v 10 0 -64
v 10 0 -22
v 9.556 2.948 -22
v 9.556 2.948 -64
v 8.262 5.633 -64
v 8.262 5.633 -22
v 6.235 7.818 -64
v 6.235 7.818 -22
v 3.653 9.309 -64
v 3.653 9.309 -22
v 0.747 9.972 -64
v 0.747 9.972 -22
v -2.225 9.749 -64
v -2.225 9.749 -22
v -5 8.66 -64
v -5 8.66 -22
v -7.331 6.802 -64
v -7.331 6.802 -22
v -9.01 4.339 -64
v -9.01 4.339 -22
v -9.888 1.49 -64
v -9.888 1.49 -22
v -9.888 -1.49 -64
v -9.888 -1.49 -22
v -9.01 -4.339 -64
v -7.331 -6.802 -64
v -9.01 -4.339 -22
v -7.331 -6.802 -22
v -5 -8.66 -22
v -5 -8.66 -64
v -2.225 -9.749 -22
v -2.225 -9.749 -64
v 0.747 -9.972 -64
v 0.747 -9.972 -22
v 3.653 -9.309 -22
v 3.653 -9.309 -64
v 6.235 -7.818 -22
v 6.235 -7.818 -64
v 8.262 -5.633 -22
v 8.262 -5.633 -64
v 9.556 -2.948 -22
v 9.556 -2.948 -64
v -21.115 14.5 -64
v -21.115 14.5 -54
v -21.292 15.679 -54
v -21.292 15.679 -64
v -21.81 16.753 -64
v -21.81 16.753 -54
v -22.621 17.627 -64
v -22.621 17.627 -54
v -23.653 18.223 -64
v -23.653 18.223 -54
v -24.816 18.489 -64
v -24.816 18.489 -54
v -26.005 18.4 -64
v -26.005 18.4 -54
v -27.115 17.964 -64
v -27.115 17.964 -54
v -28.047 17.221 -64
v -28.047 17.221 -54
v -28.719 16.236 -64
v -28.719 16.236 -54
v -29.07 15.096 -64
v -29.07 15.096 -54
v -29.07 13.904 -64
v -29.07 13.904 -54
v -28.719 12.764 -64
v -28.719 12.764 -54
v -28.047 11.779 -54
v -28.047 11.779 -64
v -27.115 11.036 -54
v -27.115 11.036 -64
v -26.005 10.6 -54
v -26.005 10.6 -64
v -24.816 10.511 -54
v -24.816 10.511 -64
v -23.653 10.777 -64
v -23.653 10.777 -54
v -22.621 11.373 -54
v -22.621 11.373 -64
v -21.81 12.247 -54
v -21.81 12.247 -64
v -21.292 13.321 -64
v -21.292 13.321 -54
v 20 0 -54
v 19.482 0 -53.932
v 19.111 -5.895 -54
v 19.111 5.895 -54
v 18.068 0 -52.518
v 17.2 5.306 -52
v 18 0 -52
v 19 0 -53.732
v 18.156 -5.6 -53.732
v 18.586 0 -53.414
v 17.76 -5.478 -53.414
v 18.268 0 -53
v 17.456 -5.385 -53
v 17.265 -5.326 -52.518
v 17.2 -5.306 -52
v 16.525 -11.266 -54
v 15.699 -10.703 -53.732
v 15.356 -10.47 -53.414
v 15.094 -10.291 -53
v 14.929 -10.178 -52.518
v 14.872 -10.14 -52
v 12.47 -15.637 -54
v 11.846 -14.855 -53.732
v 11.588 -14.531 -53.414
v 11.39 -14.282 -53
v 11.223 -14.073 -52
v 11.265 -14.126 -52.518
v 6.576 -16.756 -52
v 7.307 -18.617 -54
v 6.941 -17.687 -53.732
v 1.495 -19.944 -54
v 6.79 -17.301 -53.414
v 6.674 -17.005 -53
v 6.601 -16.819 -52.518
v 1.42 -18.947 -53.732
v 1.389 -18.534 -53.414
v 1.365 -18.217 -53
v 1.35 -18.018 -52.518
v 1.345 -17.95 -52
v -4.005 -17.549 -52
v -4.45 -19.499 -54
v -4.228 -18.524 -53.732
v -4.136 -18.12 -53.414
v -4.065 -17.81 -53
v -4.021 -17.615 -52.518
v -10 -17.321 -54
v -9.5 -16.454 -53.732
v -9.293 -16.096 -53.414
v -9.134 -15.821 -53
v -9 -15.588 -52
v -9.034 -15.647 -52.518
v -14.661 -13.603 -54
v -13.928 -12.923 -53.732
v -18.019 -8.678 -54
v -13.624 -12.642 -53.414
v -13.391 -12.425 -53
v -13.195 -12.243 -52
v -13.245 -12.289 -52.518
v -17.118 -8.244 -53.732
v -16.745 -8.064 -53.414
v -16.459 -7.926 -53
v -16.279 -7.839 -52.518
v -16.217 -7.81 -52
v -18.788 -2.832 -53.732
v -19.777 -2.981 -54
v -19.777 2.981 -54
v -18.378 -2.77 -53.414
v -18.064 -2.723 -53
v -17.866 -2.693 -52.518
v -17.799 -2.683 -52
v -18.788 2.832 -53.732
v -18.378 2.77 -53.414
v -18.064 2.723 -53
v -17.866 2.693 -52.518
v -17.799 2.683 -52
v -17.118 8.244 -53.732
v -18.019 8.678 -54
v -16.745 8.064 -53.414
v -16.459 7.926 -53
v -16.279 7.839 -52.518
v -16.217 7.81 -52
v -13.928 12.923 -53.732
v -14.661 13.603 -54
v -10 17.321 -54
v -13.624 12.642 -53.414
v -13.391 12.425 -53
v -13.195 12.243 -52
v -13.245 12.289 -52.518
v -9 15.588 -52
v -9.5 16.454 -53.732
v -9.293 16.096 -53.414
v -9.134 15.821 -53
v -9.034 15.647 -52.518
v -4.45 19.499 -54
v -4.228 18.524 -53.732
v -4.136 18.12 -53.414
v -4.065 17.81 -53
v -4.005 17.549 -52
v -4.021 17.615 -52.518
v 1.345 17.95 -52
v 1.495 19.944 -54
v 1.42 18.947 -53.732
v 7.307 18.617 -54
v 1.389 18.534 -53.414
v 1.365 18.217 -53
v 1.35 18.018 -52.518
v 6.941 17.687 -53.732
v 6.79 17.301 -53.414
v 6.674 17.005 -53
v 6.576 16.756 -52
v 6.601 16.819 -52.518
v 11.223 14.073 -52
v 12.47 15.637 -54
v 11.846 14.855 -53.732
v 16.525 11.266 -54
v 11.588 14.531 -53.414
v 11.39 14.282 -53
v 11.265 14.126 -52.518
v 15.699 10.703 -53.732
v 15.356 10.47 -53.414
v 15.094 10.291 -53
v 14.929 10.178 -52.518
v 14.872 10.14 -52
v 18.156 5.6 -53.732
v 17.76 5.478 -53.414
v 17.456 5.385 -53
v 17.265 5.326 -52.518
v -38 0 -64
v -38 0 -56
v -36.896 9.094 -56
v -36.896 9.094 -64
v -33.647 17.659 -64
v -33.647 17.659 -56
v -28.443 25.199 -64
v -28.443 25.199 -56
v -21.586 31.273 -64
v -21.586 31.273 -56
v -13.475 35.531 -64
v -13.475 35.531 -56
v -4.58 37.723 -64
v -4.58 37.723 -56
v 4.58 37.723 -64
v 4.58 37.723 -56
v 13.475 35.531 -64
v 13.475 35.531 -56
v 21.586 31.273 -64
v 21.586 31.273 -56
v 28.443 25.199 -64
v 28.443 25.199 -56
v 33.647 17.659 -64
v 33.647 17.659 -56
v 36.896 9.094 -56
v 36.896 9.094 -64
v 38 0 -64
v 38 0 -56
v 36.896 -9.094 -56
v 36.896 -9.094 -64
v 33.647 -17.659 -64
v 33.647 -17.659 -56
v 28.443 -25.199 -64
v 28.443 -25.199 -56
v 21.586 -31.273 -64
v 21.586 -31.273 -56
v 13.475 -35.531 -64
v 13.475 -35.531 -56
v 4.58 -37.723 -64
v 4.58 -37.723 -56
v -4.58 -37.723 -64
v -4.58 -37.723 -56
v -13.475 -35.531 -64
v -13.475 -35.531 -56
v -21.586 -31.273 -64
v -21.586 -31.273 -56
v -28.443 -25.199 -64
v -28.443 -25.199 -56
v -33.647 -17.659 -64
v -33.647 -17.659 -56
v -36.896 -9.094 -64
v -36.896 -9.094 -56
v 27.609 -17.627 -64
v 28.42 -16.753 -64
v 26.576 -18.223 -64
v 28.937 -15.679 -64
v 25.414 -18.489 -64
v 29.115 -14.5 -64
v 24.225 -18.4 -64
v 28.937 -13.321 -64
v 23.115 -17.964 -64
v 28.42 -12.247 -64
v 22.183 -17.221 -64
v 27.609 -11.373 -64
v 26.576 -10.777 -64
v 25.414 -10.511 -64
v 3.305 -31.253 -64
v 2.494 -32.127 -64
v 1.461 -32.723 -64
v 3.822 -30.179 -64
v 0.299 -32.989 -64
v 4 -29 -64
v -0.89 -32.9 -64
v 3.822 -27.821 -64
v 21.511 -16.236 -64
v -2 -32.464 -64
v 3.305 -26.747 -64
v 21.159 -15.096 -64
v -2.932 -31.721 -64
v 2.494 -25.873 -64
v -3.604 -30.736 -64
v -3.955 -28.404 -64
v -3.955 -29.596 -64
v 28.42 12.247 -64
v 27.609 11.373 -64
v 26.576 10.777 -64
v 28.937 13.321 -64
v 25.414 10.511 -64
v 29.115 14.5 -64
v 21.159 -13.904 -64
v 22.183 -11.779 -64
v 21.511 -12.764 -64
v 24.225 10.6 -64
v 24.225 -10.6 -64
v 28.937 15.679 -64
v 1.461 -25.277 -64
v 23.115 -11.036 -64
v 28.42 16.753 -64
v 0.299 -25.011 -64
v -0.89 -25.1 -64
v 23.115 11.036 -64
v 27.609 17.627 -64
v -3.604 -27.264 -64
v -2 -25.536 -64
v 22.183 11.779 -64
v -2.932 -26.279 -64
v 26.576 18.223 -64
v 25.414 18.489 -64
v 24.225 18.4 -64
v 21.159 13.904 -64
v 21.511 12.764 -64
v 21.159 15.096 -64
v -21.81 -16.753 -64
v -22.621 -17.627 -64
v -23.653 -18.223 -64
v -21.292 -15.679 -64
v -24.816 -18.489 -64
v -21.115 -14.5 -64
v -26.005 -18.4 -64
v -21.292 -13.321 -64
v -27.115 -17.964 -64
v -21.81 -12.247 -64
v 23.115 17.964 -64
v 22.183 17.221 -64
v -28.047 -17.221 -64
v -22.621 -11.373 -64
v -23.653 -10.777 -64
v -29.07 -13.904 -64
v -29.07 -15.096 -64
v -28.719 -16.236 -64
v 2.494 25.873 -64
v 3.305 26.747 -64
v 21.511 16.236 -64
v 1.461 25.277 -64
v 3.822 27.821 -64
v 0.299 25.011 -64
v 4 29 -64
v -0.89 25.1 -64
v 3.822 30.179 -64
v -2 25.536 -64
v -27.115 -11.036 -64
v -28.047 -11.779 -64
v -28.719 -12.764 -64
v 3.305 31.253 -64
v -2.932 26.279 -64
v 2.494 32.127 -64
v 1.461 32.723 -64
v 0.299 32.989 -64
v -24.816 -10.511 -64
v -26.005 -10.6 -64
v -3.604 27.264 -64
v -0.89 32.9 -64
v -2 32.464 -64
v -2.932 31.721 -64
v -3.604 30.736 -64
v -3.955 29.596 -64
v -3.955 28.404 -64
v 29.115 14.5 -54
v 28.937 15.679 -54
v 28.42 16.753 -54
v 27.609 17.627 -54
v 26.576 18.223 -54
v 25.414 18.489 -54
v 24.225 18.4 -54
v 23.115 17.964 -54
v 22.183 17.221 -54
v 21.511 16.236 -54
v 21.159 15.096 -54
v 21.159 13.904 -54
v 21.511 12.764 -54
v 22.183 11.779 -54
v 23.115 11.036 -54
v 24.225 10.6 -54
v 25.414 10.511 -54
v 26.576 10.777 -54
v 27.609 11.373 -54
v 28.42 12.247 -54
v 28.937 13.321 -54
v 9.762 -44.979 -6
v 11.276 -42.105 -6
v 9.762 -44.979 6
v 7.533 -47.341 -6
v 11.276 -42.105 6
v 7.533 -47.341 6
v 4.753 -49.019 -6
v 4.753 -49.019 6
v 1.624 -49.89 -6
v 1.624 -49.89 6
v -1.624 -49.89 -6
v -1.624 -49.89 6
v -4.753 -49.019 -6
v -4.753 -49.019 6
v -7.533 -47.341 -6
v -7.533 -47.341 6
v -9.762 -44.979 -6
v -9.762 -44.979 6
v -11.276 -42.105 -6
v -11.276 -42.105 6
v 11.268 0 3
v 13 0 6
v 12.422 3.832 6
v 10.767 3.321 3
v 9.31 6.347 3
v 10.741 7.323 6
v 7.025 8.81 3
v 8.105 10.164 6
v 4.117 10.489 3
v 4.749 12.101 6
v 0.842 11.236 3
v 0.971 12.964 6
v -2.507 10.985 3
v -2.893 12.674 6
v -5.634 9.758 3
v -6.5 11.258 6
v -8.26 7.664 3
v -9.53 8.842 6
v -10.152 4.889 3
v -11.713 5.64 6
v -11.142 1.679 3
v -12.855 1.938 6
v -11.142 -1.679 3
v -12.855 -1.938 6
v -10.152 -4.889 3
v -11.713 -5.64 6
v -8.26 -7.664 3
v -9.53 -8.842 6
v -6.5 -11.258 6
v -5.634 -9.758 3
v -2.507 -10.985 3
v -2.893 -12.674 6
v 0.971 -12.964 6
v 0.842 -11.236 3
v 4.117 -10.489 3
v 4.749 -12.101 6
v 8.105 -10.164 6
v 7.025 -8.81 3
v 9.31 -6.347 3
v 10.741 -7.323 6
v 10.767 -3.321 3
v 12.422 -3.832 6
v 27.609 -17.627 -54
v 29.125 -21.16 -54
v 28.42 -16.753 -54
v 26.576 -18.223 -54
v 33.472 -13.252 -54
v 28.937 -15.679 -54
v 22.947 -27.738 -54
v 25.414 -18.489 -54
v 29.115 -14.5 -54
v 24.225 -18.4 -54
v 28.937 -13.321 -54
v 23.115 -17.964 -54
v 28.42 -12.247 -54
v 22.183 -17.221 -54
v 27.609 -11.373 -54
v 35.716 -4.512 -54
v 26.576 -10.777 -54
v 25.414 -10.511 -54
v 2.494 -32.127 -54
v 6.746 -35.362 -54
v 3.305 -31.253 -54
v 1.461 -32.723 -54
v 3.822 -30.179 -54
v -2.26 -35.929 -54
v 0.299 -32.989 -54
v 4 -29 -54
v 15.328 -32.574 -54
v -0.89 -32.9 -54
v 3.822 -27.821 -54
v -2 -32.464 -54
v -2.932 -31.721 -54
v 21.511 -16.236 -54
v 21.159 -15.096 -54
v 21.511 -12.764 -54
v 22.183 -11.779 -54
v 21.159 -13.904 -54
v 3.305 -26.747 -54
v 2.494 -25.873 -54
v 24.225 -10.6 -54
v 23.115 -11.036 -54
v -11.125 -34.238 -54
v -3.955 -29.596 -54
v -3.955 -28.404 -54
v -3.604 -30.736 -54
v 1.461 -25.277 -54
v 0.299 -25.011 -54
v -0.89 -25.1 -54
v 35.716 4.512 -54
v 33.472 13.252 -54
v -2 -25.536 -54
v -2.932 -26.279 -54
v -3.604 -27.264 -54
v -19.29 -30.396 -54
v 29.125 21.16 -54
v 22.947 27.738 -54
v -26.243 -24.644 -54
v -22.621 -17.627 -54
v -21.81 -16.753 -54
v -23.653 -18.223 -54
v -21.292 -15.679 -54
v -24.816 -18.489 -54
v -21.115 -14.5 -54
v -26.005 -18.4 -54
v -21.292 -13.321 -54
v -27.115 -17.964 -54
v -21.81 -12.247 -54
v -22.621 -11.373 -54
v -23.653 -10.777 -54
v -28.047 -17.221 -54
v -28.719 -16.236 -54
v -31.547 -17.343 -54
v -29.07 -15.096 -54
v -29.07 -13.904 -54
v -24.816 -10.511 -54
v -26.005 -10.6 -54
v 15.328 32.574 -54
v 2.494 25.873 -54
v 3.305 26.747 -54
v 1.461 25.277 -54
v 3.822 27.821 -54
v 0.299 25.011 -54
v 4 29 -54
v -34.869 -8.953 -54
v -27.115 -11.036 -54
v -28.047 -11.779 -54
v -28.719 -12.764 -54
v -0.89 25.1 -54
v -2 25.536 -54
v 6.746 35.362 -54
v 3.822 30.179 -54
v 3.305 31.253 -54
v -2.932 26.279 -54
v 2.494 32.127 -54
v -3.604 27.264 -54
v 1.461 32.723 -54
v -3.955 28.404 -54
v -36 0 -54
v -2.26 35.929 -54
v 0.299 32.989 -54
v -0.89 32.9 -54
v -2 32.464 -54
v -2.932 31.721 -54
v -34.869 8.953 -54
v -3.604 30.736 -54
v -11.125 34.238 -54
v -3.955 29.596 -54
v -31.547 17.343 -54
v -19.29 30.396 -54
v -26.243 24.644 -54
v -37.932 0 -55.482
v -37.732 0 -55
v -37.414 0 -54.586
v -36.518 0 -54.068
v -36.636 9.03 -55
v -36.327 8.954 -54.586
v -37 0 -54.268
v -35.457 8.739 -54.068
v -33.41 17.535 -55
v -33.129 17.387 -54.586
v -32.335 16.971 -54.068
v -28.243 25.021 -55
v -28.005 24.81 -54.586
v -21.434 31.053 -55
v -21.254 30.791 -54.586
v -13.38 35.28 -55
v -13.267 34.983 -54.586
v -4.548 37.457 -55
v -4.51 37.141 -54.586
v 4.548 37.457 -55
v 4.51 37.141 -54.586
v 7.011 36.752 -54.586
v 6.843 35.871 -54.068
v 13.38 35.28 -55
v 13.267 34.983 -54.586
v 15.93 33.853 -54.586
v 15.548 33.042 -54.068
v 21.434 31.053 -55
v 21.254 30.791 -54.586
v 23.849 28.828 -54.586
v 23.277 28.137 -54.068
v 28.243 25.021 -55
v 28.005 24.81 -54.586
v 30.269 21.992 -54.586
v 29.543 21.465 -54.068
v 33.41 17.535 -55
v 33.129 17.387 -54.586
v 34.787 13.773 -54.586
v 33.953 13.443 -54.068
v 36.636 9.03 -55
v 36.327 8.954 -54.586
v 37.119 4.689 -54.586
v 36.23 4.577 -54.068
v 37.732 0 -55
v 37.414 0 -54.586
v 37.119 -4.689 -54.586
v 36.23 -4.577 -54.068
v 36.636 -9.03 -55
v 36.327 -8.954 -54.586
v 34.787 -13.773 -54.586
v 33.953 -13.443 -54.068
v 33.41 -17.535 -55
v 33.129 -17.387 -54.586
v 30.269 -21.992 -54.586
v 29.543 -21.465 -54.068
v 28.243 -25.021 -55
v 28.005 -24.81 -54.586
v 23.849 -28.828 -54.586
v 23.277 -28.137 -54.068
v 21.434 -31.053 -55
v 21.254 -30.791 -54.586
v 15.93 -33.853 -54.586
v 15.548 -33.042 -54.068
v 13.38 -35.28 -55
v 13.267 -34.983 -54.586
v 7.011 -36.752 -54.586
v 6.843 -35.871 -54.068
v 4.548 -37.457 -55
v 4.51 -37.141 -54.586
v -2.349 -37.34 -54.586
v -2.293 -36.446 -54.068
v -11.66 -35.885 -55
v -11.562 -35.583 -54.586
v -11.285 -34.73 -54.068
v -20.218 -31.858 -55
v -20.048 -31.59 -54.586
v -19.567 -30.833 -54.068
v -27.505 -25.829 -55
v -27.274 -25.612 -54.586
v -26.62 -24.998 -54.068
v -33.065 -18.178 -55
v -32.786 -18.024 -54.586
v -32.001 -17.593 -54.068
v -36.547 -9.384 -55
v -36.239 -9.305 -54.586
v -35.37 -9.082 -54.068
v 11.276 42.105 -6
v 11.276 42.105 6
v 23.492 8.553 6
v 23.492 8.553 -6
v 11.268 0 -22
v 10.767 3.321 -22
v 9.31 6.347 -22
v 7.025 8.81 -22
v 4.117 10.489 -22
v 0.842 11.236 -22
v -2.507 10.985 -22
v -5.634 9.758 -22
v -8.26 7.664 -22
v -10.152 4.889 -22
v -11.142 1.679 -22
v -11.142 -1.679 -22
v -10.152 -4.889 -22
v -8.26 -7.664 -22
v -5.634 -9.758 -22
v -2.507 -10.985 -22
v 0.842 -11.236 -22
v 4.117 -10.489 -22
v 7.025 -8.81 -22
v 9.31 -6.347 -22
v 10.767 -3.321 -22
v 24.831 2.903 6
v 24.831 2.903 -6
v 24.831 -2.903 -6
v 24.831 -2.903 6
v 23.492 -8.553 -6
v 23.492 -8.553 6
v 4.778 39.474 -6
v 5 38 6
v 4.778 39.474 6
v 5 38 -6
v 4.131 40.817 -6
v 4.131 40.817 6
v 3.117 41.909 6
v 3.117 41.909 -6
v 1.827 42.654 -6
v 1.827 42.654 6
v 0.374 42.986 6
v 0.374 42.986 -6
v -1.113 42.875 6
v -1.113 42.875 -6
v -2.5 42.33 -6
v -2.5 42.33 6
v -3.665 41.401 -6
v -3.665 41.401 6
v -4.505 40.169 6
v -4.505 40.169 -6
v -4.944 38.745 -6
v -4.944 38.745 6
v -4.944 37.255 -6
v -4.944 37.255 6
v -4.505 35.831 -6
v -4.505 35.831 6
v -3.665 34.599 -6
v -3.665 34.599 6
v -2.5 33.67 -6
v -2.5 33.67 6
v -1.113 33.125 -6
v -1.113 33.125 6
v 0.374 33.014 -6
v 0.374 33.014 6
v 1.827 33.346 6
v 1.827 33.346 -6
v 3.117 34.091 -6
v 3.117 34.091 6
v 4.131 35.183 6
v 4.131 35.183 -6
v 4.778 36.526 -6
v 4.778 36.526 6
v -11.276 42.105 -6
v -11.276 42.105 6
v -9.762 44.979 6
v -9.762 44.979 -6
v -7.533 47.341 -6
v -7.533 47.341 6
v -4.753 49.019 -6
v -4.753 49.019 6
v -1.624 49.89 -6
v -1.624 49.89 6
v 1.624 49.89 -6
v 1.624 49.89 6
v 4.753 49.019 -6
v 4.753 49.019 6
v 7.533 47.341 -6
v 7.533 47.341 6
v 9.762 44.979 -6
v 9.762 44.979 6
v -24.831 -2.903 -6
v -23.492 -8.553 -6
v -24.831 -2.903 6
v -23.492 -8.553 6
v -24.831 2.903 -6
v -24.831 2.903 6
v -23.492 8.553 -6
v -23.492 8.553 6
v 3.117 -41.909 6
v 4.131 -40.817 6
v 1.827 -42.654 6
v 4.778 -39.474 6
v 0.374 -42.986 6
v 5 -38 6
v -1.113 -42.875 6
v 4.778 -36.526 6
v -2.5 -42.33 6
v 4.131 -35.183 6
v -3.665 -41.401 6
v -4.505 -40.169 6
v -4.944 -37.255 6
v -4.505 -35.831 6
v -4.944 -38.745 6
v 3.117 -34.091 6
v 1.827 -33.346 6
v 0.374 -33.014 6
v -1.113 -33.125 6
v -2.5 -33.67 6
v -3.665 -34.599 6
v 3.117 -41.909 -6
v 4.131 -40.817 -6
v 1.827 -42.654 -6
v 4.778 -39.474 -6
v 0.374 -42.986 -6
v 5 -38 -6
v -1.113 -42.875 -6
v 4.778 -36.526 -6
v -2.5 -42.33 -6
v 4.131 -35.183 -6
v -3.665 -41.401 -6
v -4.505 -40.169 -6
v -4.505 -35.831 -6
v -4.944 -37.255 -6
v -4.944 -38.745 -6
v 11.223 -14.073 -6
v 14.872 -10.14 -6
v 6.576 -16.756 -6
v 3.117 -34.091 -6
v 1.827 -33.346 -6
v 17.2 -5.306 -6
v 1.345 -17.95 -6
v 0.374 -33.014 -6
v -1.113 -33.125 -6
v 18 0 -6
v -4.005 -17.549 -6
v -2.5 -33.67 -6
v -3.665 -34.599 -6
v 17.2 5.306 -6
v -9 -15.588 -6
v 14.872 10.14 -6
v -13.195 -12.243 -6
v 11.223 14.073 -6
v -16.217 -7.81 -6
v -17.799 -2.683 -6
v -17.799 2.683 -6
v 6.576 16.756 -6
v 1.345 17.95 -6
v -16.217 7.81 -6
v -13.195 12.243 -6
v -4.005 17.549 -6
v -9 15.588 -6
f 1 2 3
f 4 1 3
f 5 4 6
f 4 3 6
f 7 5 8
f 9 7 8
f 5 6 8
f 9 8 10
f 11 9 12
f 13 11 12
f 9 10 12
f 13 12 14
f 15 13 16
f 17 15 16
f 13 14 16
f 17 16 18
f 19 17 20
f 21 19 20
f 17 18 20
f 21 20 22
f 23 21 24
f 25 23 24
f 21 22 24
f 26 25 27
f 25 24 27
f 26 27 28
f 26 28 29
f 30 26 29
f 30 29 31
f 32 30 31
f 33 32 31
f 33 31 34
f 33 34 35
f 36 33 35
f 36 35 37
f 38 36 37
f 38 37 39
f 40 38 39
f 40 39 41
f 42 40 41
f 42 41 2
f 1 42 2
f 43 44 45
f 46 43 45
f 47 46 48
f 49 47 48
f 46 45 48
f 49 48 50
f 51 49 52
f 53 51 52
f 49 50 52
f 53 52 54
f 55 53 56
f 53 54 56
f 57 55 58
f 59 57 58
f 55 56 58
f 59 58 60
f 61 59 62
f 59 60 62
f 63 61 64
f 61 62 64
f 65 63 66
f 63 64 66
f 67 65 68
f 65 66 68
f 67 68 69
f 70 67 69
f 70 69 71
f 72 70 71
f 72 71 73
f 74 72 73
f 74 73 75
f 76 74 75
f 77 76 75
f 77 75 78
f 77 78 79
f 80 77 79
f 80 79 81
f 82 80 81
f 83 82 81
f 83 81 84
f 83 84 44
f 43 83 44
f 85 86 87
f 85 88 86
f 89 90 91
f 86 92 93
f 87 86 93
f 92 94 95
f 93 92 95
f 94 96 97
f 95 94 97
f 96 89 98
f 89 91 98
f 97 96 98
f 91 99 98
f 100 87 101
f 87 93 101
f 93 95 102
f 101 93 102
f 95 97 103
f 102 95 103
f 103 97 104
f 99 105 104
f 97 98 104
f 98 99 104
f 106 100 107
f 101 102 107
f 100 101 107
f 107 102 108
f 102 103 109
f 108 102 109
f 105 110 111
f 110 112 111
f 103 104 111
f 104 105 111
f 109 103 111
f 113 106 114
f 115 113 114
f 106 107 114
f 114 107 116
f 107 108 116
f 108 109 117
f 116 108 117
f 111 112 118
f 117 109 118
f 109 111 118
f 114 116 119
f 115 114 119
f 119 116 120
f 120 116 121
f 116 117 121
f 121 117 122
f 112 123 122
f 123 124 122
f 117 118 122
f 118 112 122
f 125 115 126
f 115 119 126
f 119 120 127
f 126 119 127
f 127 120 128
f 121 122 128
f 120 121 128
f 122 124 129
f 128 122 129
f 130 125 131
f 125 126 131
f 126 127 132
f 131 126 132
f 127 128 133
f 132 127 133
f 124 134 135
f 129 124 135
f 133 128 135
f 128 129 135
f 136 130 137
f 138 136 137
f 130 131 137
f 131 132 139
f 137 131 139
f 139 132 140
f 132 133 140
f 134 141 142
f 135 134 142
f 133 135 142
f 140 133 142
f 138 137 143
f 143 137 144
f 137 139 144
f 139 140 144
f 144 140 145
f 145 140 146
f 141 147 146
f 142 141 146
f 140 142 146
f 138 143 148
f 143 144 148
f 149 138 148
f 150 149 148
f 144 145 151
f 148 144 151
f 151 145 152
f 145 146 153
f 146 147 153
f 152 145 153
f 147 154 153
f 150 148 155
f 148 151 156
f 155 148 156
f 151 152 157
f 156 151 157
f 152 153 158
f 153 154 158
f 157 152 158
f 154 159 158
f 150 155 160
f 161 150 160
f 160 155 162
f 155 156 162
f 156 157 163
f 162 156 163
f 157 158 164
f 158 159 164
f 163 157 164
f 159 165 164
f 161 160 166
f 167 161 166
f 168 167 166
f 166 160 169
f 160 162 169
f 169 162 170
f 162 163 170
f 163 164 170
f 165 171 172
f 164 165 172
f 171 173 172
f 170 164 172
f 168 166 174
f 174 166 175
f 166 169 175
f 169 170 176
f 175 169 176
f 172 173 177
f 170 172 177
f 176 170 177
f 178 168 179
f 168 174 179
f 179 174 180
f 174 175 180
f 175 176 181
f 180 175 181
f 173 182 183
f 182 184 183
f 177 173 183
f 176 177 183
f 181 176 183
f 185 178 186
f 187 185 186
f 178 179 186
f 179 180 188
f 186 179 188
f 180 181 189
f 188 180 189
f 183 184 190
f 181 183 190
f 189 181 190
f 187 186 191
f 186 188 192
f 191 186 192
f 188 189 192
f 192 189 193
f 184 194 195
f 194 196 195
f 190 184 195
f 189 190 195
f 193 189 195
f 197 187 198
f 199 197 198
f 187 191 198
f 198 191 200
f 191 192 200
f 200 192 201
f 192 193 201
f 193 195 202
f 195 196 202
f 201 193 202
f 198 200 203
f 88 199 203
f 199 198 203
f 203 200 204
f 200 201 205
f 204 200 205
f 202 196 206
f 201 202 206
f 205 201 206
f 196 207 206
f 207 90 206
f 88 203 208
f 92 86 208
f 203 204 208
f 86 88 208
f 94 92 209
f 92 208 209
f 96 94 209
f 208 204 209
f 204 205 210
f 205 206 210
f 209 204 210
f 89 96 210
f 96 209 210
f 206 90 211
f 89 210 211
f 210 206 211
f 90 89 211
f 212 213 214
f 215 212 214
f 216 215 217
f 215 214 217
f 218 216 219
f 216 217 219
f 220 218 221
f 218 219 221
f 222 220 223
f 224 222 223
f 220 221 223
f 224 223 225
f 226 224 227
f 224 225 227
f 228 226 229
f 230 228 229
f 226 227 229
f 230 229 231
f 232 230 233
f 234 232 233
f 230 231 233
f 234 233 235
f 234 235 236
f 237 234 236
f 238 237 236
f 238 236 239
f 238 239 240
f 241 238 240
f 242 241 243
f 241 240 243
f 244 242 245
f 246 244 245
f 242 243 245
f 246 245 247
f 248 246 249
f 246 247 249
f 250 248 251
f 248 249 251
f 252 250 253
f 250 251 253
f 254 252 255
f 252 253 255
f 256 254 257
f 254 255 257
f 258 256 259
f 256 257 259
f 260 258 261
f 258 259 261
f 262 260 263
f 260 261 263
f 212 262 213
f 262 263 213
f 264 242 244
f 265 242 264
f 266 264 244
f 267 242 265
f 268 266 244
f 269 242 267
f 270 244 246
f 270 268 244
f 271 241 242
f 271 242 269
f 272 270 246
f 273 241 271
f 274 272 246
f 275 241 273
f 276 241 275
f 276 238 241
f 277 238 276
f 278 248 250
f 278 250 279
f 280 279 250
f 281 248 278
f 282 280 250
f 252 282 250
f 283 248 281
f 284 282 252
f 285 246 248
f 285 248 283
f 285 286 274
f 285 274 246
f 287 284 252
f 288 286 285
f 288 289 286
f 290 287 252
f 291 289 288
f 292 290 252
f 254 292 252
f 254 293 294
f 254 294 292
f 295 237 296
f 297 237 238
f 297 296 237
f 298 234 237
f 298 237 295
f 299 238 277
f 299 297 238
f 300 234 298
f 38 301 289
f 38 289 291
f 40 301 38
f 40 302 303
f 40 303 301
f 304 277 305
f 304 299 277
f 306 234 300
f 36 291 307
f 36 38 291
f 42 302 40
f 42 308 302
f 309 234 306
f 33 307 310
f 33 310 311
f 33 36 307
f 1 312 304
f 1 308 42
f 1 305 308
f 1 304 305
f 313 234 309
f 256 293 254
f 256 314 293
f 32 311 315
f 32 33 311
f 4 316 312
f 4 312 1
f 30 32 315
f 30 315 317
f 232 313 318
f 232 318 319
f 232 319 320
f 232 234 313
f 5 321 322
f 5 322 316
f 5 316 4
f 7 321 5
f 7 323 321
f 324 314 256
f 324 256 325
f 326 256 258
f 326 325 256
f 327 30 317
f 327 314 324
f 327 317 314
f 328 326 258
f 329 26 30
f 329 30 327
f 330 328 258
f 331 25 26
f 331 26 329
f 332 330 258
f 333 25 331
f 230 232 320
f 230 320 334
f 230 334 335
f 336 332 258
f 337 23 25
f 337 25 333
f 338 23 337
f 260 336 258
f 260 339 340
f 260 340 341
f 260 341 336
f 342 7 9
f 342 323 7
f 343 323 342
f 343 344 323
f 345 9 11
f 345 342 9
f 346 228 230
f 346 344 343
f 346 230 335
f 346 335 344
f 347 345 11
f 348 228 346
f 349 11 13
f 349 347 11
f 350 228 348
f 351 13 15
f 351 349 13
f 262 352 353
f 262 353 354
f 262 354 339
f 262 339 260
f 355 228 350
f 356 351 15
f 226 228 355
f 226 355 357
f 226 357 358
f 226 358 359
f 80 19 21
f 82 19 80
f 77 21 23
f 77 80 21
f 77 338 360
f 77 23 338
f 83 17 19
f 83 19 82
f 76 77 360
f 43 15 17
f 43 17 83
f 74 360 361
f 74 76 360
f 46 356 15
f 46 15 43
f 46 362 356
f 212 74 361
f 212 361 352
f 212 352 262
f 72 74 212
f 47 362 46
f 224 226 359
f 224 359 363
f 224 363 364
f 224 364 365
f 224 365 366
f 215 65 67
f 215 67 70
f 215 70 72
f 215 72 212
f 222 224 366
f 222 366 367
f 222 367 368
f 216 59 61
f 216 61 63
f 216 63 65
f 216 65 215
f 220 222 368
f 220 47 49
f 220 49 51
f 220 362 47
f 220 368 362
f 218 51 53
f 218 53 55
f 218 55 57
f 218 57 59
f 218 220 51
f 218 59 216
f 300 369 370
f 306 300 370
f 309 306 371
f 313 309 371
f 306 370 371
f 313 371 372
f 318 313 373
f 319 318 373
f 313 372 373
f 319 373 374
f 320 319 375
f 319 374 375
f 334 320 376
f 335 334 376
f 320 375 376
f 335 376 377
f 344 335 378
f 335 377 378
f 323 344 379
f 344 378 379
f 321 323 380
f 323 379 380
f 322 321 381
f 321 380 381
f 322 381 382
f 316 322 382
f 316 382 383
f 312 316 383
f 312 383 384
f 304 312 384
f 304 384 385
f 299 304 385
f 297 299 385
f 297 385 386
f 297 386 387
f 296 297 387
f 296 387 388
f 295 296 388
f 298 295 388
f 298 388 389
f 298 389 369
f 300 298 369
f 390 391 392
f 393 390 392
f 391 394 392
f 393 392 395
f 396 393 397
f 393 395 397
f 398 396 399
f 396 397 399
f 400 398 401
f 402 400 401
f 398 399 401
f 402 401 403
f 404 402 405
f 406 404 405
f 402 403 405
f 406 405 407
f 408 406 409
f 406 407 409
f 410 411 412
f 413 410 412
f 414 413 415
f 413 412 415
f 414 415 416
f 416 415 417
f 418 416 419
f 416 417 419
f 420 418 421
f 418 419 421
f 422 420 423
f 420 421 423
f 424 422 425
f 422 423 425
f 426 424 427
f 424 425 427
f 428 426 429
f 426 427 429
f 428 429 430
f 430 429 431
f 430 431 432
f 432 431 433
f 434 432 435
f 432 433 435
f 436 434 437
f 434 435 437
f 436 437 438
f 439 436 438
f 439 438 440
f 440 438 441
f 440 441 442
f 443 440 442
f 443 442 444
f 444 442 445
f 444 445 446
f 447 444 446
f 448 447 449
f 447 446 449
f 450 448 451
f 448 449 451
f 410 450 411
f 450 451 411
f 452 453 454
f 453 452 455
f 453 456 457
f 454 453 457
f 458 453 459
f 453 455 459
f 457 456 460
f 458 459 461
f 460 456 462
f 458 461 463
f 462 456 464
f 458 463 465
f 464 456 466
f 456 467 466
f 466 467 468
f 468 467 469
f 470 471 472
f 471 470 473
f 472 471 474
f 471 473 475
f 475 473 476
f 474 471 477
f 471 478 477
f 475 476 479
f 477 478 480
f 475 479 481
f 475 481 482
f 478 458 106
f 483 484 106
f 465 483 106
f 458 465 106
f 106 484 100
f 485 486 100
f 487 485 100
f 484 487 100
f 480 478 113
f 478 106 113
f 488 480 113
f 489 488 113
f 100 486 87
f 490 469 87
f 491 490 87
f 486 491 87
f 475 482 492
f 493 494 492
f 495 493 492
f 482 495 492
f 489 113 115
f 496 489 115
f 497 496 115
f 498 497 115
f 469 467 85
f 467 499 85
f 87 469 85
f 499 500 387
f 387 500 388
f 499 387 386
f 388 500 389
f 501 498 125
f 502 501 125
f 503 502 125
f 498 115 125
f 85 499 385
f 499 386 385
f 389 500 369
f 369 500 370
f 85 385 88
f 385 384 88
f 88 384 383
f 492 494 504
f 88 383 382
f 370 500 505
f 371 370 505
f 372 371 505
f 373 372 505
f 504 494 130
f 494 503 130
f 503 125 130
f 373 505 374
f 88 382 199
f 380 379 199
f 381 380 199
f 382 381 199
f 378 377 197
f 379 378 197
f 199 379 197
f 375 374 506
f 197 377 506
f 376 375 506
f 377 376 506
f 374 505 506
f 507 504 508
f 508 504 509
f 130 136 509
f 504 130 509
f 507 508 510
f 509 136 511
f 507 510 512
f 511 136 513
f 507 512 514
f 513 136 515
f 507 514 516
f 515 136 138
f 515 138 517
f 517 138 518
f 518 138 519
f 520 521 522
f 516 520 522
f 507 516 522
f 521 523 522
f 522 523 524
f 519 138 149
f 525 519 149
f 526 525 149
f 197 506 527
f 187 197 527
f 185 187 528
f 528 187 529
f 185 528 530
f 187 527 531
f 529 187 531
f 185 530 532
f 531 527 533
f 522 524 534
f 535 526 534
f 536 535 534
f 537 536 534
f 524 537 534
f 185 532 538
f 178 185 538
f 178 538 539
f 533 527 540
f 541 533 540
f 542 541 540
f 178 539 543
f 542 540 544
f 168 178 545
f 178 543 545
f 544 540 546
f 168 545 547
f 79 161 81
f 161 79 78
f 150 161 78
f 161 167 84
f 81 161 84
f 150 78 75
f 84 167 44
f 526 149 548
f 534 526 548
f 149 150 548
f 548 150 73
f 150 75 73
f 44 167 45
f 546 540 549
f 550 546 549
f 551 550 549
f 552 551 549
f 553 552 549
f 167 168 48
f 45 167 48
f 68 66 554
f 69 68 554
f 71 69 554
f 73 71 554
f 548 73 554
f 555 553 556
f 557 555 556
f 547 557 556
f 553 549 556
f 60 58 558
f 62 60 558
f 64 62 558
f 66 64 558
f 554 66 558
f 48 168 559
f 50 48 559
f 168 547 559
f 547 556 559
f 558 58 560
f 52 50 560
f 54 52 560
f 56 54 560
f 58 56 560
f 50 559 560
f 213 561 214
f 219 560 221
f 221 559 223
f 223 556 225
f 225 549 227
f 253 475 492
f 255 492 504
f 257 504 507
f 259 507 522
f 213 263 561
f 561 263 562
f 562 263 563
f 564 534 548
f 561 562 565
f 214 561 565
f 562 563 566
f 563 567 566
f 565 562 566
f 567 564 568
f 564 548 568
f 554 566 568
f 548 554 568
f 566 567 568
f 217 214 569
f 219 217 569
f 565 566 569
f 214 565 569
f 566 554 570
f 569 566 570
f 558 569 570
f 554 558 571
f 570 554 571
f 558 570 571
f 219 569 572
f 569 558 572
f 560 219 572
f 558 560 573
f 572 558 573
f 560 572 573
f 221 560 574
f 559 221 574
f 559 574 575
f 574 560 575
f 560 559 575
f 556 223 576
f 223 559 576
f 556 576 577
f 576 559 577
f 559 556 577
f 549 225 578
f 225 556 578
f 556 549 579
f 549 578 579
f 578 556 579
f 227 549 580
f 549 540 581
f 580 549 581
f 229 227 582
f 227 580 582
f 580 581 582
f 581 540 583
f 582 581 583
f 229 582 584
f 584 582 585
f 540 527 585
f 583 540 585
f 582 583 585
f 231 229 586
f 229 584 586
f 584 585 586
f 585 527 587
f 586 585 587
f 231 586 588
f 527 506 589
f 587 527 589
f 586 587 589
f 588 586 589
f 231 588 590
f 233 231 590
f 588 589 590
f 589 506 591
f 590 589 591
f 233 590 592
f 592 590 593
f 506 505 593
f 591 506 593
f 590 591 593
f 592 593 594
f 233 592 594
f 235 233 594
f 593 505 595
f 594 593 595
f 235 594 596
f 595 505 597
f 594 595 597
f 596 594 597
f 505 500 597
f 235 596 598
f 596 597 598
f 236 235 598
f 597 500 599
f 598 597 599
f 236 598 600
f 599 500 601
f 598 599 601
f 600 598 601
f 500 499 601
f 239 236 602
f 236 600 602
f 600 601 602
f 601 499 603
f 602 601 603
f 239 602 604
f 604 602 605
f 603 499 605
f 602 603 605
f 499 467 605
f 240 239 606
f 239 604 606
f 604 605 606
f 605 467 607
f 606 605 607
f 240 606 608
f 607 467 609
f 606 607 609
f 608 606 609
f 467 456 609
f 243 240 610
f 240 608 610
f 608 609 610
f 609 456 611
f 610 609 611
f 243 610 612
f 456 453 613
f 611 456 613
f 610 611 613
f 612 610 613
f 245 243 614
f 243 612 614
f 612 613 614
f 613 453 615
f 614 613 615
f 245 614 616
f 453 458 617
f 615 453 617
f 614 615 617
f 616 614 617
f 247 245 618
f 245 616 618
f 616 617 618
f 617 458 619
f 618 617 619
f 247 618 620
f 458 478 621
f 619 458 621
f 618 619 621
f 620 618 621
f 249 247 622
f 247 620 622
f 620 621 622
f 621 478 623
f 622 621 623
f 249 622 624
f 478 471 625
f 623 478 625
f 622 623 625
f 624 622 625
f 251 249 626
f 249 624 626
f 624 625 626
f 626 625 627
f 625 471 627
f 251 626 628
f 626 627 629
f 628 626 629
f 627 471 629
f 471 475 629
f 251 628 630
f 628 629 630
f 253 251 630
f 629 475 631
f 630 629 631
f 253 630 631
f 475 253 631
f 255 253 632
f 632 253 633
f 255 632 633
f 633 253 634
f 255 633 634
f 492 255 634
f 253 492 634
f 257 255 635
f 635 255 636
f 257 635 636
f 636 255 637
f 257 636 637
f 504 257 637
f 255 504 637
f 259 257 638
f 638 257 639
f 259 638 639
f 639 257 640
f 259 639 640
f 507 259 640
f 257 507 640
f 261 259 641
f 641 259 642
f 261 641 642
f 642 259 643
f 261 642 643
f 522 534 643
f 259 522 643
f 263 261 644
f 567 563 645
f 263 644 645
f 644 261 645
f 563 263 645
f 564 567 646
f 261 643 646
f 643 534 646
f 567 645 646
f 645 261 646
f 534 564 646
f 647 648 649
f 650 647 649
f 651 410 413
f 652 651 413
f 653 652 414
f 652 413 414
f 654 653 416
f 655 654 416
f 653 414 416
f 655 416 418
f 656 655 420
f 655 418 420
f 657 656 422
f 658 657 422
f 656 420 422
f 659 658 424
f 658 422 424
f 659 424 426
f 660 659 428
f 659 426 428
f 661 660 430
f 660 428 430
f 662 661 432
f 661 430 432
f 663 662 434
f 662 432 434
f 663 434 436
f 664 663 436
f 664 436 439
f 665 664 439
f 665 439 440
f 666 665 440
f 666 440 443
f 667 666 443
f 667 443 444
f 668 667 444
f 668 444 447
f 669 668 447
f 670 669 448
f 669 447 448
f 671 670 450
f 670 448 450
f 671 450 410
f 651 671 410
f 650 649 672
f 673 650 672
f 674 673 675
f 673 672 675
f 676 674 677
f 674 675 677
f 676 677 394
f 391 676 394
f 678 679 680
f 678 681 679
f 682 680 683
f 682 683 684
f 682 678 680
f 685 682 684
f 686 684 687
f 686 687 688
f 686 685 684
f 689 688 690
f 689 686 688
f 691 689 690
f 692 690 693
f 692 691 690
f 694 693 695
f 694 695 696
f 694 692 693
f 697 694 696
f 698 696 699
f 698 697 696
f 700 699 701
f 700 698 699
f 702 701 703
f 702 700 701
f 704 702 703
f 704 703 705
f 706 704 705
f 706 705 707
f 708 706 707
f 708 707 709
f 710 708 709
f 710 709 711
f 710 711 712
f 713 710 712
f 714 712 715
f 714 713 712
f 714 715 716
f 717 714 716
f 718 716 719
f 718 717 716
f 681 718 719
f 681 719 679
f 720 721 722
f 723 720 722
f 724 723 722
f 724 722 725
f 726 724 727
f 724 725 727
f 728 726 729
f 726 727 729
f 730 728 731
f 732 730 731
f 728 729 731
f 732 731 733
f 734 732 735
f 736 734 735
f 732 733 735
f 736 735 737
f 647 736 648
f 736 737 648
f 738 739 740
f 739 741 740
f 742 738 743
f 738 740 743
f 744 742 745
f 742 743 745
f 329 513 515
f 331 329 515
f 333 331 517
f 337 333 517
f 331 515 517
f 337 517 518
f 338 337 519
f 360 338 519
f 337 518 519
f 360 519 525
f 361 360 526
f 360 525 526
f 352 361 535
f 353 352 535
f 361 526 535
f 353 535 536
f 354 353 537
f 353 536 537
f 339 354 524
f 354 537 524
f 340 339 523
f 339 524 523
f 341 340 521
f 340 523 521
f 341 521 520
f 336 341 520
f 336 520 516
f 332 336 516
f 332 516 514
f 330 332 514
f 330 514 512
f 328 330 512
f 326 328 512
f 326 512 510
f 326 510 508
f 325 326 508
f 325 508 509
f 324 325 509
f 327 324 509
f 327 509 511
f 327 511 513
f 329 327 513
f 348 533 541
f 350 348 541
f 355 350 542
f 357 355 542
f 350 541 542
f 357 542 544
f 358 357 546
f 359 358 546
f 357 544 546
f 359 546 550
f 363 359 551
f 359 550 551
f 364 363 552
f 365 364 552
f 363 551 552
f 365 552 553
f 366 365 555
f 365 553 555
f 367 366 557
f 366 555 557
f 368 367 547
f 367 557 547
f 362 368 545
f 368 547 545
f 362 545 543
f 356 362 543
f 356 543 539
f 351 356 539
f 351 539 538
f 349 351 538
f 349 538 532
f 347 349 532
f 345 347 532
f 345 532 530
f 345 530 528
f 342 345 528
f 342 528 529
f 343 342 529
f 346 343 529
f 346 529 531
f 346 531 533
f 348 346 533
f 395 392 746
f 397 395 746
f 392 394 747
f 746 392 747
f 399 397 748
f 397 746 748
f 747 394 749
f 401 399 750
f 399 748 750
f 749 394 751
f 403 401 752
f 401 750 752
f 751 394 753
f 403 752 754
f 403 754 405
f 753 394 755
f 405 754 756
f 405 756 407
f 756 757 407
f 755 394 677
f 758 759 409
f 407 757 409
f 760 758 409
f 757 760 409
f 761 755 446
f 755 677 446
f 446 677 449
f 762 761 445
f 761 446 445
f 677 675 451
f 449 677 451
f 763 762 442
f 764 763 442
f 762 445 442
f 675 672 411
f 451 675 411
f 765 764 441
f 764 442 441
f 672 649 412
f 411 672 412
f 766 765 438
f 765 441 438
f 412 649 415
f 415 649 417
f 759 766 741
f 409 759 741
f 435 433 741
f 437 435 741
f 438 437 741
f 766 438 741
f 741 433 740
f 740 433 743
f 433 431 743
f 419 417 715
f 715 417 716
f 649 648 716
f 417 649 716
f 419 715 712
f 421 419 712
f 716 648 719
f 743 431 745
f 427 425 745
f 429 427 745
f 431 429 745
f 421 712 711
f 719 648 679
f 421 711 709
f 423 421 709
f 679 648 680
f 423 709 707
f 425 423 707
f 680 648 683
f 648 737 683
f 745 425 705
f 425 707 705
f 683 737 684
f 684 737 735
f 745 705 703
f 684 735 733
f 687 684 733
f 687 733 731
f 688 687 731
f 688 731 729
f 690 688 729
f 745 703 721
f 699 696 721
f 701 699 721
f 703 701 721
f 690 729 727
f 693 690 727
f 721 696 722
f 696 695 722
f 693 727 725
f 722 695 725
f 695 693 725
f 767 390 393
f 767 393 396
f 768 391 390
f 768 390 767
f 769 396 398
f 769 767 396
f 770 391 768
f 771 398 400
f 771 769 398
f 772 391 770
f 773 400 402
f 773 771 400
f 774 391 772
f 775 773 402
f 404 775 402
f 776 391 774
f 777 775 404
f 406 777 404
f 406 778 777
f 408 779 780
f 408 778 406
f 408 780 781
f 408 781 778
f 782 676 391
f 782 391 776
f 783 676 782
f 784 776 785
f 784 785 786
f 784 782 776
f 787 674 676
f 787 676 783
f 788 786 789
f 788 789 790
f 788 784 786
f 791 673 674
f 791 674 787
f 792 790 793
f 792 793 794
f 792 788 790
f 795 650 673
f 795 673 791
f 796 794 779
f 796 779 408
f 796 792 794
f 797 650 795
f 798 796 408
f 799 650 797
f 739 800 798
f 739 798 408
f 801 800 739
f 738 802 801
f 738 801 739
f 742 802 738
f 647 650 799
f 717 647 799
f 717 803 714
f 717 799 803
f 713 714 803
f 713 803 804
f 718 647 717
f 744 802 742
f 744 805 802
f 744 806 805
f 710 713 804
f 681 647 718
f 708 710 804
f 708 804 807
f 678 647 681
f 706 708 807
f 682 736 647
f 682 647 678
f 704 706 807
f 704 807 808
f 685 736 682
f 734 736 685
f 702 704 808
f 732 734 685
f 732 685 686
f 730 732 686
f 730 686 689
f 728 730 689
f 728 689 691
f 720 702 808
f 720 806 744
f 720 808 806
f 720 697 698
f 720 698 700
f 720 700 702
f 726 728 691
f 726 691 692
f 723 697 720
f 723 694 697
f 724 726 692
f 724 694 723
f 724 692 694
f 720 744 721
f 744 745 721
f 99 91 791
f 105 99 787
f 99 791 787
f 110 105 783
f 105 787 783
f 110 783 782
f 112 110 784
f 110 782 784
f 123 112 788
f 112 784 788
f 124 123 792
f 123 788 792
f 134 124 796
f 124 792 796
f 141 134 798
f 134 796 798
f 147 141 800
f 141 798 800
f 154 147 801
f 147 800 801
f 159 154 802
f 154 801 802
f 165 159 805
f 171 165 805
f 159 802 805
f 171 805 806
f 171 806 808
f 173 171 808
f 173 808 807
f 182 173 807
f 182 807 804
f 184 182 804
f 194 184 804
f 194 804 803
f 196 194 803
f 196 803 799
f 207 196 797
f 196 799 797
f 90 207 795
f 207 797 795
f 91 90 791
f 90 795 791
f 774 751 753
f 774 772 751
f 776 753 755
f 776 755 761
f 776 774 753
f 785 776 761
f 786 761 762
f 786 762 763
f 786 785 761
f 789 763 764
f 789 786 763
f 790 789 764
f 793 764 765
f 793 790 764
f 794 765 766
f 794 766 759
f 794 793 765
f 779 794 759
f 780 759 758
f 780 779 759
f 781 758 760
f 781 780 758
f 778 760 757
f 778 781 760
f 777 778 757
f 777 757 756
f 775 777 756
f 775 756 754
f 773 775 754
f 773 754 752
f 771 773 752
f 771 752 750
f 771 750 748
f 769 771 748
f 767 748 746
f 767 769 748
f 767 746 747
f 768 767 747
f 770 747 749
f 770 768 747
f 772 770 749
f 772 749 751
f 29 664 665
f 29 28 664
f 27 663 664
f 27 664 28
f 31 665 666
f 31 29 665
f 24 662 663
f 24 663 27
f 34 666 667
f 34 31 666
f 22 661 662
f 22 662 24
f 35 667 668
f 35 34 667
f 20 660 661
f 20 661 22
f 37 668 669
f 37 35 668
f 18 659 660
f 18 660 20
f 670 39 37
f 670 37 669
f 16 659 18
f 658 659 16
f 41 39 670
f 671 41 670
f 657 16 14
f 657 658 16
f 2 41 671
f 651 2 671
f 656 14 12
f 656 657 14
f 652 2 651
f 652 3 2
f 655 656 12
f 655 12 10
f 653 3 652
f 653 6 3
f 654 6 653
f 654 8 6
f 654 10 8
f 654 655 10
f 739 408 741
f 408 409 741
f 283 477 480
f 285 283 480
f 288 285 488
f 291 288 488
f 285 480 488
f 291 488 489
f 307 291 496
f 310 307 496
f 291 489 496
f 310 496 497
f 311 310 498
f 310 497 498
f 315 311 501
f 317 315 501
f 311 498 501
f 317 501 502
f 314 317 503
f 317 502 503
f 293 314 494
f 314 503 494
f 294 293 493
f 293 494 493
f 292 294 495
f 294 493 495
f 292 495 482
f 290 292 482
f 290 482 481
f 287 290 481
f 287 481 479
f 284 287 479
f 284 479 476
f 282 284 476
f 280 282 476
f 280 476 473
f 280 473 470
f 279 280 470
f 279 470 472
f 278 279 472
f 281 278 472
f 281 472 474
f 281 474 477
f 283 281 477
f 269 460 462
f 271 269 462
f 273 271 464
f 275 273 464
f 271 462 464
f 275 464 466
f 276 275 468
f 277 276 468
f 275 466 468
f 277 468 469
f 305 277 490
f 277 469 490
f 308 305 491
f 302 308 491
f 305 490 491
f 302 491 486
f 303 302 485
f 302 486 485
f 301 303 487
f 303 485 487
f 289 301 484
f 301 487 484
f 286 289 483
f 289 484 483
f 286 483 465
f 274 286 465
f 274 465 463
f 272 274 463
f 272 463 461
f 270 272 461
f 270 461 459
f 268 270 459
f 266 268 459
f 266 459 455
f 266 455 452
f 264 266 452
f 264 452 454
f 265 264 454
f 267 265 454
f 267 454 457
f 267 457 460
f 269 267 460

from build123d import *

# Parameters (mm, degrees)
SKETCH1_R           = 5
BOSS_EXTRUDE1_DEPTH = 6
SKETCH2_R           = 13
CUT_EXTRUDE1_DEPTH  = 3
CUT_EXTRUDE1_DRAFT  = -30
SKETCH3_R           = 18
BOSS_EXTRUDE2_DEPTH = 48
SKETCH4_R           = 38
BOSS_EXTRUDE3_DEPTH = 10
SKETCH5_R           = 11.267949192
CUT_EXTRUDE2_DEPTH  = 25
SKETCH6_R           = 10
CUT_EXTRUDE3_DEPTH  = 76.55130707
SKETCH7_R           = 4
CUT_EXTRUDE4_DEPTH  = 87.856203002
FILLET1_R           = 2


with BuildPart() as part:
    # Sketch1 → Boss-Extrude1 (new, symmetric)
    with BuildSketch(Plane.XY):
        with BuildLine():
            Line((23.491540883, -8.552631579), (11.275939624, -42.105263158))
            ThreePointArc((11.275939624, -42.105263158), (0, -50), (-11.275939624, -42.105263158))
            Line((-11.275939624, -42.105263158), (-23.491540883, -8.552631579))
            ThreePointArc((-23.491540883, -8.552631579), (-25, 0), (-23.491540883, 8.552631579))
            Line((-23.491540883, 8.552631579), (-11.275939624, 42.105263158))
            ThreePointArc((-11.275939624, 42.105263158), (0, 50), (11.275939624, 42.105263158))
            Line((11.275939624, 42.105263158), (23.491540883, 8.552631579))
            ThreePointArc((23.491540883, 8.552631579), (25, 0), (23.491540883, -8.552631579))
        make_face()
        with Locations((0, -38)):
            Circle(SKETCH1_R, mode=Mode.SUBTRACT)
        with Locations((0, 38)):
            Circle(SKETCH1_R, mode=Mode.SUBTRACT)
    extrude(amount=BOSS_EXTRUDE1_DEPTH, both=True)


with BuildPart() as cut_extrude1_tool:
    # Sketch2 → Cut-Extrude1 (with draft: the straight prism first)
    with BuildSketch(Plane.XY.offset(6)):
        Circle(SKETCH2_R)
    extrude(amount=-CUT_EXTRUDE1_DEPTH)
    # Cut-Extrude1: the draft: its side faces are tilted about the plane it starts from
    cut_extrude1_sides = [cut_extrude1_tool.faces().sort_by_distance(p)[0] for p in [
        (-13, 0, 4.5),
    ]]
    draft(cut_extrude1_sides, Plane.XY.offset(6), CUT_EXTRUDE1_DRAFT)


with BuildPart() as part_1:
    add(part.part)

    # Cut-Extrude1: cut by cut_extrude1_tool
    add(cut_extrude1_tool.part, mode=Mode.SUBTRACT)

    # Sketch3 → Boss-Extrude2 (add)
    with BuildSketch(Plane(origin=(0, 0, -6), x_dir=(-1, 0, 0), z_dir=(0, 0, -1))):
        with Locations(Location((0, 0, 0), (0, 0, 180))):
            Circle(SKETCH3_R)
    extrude(amount=BOSS_EXTRUDE2_DEPTH)

    # Sketch4 → Boss-Extrude3 (add)
    with BuildSketch(Plane(origin=(0, 0, -54), x_dir=(-1, 0, 0), z_dir=(0, 0, -1))):
        Circle(SKETCH4_R)
    extrude(amount=BOSS_EXTRUDE3_DEPTH)

    # Sketch5 → Cut-Extrude2 (cut)
    with BuildSketch(Plane.XY.offset(3)):
        Circle(SKETCH5_R)
    extrude(amount=-CUT_EXTRUDE2_DEPTH, mode=Mode.SUBTRACT)

    # Sketch6 → Cut-Extrude3 (cut, through all)
    with BuildSketch(Plane.XY.offset(-22)):
        Circle(SKETCH6_R)
    extrude(amount=-CUT_EXTRUDE3_DEPTH, mode=Mode.SUBTRACT)

    # Sketch7 → Cut-Extrude4 (cut, through all)
    with BuildSketch(Plane.XY.offset(-54)):
        with Locations((0, 29)):
            Circle(SKETCH7_R)
        with Locations((25.11473671, 14.5)):
            Circle(SKETCH7_R)
        with Locations((25.11473671, -14.5)):
            Circle(SKETCH7_R)
        with Locations((0, -29)):
            Circle(SKETCH7_R)
        with Locations((-25.11473671, -14.5)):
            Circle(SKETCH7_R)
        with Locations((-25.11473671, 14.5)):
            Circle(SKETCH7_R)
    extrude(amount=-CUT_EXTRUDE4_DEPTH, mode=Mode.SUBTRACT)

    # Fillet1
    fillet1_edges = [part_1.edges().sort_by_distance(p)[0] for p in [
        (-18, 0, -54),
        (38, 0, -54),
    ]]
    fillet(fillet1_edges, radius=FILLET1_R)


solid = part_1.part
